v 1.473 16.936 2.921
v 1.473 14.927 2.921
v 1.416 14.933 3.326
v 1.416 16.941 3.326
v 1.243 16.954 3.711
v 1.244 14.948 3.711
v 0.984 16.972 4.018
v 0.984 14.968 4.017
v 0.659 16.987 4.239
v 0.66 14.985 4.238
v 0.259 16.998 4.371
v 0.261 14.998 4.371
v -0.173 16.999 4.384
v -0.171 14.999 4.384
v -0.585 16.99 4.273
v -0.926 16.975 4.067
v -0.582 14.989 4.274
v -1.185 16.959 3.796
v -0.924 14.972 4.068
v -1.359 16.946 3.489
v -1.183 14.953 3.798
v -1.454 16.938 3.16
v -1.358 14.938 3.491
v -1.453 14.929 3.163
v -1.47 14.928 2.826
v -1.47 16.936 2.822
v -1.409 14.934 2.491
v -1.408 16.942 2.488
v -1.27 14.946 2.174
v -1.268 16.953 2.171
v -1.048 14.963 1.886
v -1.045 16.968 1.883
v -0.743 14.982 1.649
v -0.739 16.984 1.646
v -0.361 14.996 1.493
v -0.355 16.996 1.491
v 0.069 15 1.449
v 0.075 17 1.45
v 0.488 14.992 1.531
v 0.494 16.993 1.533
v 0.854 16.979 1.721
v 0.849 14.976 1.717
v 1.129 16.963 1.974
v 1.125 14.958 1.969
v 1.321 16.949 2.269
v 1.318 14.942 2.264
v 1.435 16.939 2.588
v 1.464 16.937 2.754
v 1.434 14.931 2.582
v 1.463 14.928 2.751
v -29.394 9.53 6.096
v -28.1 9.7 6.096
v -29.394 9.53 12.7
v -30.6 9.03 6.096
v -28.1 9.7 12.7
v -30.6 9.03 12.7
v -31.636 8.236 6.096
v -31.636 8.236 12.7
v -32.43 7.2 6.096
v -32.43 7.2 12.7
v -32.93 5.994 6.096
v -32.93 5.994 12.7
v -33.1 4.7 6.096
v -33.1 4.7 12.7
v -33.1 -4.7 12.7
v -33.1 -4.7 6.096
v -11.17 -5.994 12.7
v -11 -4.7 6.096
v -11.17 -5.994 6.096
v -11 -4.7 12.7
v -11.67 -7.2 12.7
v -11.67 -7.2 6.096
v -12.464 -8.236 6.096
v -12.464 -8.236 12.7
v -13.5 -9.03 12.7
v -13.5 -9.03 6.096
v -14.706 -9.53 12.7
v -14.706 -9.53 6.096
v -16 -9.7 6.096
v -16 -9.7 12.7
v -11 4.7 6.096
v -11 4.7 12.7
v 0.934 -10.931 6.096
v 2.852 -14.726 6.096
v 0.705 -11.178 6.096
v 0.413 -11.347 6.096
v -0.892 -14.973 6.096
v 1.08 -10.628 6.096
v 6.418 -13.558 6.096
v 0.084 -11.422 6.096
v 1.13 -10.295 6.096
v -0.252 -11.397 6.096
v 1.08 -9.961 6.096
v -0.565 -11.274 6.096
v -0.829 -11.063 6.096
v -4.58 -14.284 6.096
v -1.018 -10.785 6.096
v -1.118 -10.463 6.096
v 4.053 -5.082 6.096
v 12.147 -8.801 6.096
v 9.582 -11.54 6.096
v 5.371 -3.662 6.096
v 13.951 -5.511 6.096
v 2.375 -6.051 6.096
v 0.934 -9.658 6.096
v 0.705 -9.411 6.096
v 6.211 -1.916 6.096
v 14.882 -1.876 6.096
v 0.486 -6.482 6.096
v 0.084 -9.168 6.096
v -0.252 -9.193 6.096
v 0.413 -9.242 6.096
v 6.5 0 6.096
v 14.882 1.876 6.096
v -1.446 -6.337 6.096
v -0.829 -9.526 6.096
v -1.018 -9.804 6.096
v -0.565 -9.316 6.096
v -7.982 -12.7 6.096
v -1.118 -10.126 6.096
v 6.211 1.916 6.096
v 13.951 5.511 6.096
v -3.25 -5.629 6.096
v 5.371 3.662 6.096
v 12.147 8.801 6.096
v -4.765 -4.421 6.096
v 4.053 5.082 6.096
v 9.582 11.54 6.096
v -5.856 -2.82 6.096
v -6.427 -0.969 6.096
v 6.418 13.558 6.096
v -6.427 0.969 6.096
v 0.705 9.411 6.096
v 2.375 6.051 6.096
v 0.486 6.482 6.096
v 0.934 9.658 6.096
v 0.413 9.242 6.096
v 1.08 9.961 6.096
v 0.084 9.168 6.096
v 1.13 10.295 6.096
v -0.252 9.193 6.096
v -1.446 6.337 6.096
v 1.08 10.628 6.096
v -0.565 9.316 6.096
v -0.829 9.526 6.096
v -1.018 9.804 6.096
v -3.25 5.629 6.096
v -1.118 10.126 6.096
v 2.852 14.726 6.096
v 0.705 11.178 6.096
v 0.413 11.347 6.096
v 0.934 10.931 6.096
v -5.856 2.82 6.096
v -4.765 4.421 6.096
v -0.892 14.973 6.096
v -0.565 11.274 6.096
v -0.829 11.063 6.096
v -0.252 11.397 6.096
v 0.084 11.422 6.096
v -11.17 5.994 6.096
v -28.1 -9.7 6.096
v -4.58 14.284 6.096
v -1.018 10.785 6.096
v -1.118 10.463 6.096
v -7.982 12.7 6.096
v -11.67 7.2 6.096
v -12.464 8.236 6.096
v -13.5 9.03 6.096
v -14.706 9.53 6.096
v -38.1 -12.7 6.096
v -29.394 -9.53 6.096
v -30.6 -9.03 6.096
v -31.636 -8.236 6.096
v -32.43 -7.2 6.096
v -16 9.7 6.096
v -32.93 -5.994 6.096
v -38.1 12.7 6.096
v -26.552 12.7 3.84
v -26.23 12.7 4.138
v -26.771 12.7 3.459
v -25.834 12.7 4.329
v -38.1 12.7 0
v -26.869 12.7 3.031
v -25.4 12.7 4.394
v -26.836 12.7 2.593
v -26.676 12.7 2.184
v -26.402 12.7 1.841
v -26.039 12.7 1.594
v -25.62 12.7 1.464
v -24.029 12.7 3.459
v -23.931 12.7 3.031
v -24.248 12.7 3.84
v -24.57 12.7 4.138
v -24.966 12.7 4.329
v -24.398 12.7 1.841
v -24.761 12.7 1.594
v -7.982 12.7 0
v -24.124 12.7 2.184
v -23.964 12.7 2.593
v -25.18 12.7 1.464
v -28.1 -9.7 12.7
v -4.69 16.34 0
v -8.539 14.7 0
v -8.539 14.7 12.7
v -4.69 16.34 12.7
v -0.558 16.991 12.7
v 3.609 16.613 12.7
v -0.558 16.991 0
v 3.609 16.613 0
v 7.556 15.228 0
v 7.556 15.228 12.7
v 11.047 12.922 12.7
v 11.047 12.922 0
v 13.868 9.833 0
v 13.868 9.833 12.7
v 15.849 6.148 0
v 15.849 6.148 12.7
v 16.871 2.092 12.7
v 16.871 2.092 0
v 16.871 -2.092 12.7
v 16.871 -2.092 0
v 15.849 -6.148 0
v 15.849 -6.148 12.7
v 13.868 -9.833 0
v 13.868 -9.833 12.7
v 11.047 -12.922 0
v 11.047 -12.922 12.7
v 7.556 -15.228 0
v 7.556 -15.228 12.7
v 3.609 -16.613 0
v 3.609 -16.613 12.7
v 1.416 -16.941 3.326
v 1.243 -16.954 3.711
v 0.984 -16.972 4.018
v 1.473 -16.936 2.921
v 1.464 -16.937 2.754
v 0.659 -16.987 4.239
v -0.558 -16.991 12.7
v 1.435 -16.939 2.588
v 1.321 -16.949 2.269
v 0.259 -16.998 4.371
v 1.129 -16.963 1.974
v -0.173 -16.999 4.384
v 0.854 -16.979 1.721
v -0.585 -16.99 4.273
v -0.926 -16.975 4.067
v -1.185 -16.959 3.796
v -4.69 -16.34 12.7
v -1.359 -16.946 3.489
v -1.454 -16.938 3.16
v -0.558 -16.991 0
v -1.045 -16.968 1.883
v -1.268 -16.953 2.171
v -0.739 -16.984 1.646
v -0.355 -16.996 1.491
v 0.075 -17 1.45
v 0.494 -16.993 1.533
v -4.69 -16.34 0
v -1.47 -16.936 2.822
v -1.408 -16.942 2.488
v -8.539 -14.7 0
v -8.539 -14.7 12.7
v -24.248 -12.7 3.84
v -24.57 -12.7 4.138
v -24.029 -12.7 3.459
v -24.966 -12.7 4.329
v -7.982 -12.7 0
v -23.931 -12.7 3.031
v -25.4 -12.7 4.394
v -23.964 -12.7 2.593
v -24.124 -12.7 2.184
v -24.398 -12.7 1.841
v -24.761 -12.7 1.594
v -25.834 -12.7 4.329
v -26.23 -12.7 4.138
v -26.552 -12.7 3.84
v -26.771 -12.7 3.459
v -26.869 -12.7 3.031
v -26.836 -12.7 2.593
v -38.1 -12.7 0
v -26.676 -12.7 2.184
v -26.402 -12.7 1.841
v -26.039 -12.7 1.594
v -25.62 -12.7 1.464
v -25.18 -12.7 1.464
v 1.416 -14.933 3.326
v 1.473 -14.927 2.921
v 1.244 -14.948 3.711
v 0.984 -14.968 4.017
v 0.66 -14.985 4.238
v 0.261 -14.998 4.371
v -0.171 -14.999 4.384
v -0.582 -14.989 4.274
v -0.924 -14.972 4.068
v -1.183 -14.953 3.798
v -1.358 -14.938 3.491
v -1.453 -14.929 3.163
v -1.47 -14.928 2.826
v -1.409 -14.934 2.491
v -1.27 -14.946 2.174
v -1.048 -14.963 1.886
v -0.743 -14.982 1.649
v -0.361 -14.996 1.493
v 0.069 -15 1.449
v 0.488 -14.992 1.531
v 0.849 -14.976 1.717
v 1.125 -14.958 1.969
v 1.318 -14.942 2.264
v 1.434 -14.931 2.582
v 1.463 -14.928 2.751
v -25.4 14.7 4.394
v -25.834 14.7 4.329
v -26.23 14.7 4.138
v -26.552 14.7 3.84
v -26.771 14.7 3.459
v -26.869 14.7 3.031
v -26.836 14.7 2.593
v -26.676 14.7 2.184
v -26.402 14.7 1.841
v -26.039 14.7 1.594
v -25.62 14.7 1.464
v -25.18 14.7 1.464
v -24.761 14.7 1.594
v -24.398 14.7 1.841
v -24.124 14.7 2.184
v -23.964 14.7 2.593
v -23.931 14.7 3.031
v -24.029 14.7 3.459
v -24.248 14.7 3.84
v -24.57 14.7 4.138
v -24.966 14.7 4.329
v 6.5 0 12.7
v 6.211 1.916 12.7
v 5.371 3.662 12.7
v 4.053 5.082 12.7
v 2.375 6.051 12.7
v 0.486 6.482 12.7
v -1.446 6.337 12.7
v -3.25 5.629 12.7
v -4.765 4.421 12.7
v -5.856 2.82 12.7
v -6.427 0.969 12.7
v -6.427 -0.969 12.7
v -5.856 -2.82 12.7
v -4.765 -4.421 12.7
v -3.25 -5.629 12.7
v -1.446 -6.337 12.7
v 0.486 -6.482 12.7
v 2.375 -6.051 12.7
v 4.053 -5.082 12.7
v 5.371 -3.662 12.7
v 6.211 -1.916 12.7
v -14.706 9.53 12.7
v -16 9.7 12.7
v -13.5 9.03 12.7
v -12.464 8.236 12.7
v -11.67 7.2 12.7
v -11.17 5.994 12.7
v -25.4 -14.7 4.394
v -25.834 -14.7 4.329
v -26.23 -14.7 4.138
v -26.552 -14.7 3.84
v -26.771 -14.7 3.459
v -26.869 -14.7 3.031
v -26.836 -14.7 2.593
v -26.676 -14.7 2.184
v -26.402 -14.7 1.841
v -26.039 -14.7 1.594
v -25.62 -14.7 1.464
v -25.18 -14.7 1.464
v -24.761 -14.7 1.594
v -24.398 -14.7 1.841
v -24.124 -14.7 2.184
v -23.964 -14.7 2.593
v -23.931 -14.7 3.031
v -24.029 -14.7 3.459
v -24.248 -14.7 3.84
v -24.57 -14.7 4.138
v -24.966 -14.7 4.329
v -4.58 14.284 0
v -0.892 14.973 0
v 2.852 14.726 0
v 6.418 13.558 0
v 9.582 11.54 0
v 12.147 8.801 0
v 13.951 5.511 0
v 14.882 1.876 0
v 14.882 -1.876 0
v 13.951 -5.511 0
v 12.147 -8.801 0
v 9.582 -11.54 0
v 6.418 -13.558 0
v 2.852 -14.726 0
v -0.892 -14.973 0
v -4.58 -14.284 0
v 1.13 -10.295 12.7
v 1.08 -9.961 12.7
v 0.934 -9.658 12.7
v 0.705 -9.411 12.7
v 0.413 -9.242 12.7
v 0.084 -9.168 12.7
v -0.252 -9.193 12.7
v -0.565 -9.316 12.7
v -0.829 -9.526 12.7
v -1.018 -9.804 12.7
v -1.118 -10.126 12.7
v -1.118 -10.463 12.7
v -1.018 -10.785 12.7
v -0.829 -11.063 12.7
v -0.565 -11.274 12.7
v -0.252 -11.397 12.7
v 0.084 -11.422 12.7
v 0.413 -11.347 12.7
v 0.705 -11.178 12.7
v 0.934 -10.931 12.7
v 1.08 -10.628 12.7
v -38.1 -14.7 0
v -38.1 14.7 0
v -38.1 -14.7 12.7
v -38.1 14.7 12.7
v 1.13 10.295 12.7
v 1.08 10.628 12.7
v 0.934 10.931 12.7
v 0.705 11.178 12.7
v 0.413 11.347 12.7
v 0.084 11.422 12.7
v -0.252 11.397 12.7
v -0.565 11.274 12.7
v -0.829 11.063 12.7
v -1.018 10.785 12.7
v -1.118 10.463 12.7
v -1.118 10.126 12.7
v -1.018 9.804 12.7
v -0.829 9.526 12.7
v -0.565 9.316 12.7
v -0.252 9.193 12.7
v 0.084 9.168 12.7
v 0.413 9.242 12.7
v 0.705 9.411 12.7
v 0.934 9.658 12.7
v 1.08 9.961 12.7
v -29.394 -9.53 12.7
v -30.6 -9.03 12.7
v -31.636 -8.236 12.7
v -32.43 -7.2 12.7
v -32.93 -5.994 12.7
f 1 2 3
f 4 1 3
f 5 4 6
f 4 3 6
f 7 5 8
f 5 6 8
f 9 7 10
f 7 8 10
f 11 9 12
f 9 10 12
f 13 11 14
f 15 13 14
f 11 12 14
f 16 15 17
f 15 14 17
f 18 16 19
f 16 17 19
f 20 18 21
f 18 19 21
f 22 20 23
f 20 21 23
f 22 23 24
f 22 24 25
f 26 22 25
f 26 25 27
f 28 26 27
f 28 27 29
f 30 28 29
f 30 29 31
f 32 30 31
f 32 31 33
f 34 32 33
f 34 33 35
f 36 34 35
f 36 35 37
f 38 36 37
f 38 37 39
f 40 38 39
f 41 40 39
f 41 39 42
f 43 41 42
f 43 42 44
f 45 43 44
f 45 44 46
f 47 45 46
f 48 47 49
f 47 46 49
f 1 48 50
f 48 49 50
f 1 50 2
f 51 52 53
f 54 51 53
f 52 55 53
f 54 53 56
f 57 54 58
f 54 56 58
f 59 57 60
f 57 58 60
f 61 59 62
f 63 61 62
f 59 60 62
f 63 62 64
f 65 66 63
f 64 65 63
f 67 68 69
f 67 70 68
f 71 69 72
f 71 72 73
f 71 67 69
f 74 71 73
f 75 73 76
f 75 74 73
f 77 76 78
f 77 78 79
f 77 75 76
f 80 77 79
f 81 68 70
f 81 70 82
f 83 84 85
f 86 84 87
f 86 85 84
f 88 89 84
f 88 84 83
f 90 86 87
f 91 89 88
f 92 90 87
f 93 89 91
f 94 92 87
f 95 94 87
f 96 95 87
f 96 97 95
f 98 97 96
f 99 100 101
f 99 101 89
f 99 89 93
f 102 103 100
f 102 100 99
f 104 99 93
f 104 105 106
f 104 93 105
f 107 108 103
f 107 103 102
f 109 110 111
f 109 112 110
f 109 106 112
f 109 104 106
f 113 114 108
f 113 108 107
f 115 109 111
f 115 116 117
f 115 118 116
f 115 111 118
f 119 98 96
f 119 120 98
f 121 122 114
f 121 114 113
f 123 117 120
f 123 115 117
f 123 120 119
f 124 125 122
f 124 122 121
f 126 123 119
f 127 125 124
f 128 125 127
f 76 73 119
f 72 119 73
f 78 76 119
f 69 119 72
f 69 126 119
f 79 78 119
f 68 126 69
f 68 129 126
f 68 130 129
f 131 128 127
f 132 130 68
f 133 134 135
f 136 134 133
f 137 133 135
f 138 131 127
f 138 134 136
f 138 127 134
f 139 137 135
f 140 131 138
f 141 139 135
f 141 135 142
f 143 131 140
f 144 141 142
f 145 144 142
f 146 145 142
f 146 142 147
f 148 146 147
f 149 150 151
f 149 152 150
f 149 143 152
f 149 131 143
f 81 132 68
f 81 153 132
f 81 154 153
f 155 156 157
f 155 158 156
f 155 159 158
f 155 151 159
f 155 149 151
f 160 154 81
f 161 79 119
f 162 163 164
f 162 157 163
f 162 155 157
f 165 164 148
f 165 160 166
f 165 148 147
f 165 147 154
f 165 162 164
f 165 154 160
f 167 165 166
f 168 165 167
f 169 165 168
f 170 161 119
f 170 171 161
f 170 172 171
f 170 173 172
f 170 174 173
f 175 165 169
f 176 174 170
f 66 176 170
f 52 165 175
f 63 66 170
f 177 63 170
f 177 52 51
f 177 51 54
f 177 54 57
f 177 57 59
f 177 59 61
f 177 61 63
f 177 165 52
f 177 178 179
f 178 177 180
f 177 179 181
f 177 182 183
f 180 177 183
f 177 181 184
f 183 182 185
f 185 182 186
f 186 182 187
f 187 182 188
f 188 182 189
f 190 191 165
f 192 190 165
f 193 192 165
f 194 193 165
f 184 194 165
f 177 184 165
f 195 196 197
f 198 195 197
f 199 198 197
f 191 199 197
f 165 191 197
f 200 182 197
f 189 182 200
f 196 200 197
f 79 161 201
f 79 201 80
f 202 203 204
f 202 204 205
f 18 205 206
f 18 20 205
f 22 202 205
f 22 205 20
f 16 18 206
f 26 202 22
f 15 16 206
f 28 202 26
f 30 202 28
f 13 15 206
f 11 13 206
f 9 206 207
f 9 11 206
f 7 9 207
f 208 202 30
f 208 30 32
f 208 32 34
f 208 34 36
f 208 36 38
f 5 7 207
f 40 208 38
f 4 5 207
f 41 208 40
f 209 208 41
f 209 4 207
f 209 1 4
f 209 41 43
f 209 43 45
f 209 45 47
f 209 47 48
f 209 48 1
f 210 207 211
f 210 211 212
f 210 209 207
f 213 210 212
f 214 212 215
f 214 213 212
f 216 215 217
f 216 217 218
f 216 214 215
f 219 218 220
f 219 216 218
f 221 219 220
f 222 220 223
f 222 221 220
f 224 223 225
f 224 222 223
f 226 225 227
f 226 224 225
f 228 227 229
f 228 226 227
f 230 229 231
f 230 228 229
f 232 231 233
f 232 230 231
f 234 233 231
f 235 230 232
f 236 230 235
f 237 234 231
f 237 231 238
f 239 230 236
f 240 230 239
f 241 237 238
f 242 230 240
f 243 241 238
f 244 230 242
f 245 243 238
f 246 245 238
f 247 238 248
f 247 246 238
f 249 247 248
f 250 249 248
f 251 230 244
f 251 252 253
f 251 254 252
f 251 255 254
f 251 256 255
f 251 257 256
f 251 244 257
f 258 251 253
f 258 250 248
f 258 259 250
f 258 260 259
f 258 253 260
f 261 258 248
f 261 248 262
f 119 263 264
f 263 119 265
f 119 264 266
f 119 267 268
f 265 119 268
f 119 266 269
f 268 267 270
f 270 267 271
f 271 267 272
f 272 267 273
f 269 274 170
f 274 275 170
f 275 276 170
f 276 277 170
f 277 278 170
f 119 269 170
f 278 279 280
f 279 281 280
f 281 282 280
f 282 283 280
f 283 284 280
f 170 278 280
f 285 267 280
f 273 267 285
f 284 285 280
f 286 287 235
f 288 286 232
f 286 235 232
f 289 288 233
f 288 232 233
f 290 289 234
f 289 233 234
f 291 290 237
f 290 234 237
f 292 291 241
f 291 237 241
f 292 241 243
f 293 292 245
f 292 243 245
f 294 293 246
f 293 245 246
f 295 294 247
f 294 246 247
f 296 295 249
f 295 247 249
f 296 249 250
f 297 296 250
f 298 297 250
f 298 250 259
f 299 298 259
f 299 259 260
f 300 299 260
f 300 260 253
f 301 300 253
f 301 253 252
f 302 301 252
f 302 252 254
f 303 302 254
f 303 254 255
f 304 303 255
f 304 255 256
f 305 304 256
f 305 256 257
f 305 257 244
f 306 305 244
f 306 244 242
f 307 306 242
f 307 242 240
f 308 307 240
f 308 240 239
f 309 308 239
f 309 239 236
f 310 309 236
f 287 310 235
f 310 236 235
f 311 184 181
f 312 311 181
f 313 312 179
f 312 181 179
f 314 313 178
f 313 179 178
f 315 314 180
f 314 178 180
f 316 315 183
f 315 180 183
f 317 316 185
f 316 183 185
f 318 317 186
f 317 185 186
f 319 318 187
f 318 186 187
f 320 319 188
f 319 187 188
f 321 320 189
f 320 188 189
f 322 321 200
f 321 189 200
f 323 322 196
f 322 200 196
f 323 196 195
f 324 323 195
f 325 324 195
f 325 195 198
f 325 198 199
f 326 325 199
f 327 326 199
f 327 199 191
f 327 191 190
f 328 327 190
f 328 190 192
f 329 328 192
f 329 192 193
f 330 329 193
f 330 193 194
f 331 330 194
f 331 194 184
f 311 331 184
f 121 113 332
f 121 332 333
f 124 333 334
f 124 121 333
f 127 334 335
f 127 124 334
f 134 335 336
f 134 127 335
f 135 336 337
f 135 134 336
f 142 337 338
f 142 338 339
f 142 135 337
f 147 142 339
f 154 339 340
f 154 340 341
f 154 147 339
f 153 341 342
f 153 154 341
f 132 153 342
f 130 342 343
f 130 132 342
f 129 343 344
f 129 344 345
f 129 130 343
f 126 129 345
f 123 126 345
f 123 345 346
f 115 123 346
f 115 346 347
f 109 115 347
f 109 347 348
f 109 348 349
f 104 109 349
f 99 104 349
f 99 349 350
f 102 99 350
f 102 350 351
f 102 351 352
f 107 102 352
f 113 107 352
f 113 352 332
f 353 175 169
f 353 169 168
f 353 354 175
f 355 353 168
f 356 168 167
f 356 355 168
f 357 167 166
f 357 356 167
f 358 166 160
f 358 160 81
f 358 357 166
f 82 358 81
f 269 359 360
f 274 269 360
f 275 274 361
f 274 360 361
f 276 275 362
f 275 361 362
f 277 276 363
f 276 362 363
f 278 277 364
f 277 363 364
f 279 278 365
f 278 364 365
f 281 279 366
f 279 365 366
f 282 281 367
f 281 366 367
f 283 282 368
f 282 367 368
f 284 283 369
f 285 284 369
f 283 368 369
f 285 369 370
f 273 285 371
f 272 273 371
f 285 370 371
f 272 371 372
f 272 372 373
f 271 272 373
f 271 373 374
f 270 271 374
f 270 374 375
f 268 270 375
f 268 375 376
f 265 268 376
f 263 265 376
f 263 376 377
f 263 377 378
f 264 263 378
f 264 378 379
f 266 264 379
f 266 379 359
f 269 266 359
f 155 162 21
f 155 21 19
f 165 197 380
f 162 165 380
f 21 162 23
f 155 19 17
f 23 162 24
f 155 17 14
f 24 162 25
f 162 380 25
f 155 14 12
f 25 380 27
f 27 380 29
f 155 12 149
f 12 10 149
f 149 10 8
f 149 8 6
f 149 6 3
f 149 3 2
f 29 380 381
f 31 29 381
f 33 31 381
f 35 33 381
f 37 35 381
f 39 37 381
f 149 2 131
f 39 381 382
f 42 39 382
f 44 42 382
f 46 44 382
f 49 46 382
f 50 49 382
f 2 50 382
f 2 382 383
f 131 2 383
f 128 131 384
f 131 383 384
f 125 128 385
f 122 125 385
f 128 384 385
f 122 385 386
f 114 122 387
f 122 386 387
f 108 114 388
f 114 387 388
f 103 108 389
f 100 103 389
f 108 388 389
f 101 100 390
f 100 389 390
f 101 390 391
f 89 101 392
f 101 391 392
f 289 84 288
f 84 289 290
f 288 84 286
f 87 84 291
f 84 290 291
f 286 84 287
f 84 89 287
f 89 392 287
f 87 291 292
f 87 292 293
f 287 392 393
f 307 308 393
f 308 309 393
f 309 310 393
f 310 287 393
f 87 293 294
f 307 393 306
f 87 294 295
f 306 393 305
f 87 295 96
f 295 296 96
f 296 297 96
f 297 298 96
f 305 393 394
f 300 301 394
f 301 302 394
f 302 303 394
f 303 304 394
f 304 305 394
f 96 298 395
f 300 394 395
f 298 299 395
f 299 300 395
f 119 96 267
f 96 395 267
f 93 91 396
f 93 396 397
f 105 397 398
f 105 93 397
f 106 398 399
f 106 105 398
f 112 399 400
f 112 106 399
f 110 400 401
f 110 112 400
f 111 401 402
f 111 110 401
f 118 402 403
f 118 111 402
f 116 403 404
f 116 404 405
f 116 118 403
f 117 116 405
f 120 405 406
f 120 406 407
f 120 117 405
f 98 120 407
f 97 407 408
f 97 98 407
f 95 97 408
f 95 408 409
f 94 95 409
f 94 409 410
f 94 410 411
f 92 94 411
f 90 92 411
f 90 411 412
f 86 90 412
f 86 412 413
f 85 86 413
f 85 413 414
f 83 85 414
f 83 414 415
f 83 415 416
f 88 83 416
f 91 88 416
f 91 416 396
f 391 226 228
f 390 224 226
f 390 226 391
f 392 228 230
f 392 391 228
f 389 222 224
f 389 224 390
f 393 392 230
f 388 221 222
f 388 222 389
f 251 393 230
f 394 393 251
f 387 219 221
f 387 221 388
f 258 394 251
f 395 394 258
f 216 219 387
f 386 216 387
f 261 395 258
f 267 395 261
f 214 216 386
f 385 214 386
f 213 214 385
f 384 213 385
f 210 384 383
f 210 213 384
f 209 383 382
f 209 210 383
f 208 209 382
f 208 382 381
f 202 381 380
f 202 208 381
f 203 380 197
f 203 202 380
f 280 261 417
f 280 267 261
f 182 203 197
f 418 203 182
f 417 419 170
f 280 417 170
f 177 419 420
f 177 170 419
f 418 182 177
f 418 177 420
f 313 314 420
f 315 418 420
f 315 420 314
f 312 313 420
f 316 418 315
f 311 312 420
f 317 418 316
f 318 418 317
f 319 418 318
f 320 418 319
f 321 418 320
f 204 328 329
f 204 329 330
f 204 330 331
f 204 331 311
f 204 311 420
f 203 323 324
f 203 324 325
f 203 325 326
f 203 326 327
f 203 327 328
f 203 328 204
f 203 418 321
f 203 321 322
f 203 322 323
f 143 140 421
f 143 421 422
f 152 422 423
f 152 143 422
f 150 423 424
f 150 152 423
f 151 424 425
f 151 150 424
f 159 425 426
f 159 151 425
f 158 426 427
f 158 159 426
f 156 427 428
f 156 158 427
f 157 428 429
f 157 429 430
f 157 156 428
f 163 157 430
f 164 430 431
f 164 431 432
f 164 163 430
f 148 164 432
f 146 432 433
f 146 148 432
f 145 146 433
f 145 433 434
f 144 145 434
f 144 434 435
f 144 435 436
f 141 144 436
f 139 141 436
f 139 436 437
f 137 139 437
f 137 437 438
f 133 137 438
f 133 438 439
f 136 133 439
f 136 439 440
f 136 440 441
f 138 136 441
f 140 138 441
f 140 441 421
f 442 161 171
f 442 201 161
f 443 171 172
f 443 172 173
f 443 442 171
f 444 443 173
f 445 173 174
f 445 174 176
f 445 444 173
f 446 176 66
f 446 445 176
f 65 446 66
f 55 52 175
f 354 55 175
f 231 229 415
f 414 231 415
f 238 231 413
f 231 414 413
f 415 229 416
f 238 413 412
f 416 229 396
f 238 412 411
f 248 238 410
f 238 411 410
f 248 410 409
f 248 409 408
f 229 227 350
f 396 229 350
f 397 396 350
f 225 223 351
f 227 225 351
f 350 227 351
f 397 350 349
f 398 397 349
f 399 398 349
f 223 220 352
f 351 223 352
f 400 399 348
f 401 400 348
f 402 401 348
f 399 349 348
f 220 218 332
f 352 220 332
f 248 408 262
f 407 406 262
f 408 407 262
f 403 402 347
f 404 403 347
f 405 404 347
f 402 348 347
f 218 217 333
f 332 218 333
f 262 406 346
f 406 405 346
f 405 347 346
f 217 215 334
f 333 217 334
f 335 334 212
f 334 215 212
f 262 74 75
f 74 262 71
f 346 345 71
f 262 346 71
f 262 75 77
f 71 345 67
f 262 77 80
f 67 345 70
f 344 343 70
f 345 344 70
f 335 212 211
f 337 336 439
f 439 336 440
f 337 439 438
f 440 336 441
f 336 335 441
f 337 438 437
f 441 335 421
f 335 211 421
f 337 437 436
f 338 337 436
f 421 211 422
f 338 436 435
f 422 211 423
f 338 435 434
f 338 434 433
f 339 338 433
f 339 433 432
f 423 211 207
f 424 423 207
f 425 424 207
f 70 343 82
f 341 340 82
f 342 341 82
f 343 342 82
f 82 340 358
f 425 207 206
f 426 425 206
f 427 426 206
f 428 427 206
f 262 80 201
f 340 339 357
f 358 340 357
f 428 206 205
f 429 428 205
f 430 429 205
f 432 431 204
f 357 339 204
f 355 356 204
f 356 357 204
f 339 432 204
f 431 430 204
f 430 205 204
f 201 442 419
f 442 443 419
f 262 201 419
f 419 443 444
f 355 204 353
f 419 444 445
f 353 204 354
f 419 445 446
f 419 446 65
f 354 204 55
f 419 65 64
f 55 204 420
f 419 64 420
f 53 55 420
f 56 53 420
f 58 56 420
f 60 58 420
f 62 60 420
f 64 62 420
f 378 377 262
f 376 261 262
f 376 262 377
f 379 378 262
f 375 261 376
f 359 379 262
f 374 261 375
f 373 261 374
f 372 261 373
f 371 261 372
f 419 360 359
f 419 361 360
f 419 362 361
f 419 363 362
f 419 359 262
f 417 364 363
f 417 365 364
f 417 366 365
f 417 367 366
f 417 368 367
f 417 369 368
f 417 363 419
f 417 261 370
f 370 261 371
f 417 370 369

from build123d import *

# Parameters (mm, degrees)
SKETCH2_R           = 6.5
SKETCH2_R_2         = 1.1303
SKETCH2_W           = 22.1
SKETCH2_H           = 19.4
BOSS_EXTRUDE1_DEPTH = 12.7
CUT_EXTRUDE1_DEPTH  = 6.096
FILLET1_R           = 5
SKETCH6_R           = 1.4732
CUT_EXTRUDE4_DEPTH  = 53.620338273


with BuildPart() as part:
    # Sketch2 → Boss-Extrude1 (new body)
    with BuildSketch(Plane.XY):
        with BuildLine():
            Line((-38.1, -14.7), (-38.1, 14.7))
            Line((-38.1, 14.7), (-8.538735269, 14.7))
            ThreePointArc((-8.538735269, 14.7), (17, 0), (-8.538735269, -14.7))
            Line((-8.538735269, -14.7), (-38.1, -14.7))
        make_face()
        Circle(SKETCH2_R, mode=Mode.SUBTRACT)
        with Locations((0, -10.294657794)):
            Circle(SKETCH2_R_2, mode=Mode.SUBTRACT)
        with Locations((0, 10.294657794)):
            Circle(SKETCH2_R_2, mode=Mode.SUBTRACT)
        with Locations((-22.05, 0)):
            Rectangle(SKETCH2_W, SKETCH2_H, mode=Mode.SUBTRACT)
    extrude(amount=BOSS_EXTRUDE1_DEPTH)

    # Sketch1 → Cut-Extrude1 (cut)
    with BuildSketch(Plane.XY):
        with BuildLine():
            Line((-38.1, -12.7), (-38.1, 12.7))
            Line((-38.1, 12.7), (-7.981854421, 12.7))
            ThreePointArc((-7.981854421, 12.7), (15, 0), (-7.981854421, -12.7))
            Line((-7.981854421, -12.7), (-38.1, -12.7))
        make_face()
    extrude(amount=CUT_EXTRUDE1_DEPTH, mode=Mode.SUBTRACT)

    # Fillet1
    fillet1_edges = [part.edges().sort_by_distance(p)[0] for p in [
        (-33.1, 9.7, 9.398),
        (-33.1, -9.7, 9.398),
        (-11, -9.7, 9.398),
        (-11, 9.7, 9.398),
    ]]
    fillet(fillet1_edges, radius=FILLET1_R)

    # Sketch6 → Cut-Extrude4 (cut, through all)
    with BuildSketch(Plane(origin=(0, -17, 0), x_dir=(-1, 0, 0), z_dir=(0, -1, 0))):
        with Locations(Location((0, -2.921, 0), (0, 0, 180))):
            Circle(SKETCH6_R)
        with Locations(Location((25.4, -2.921, 0), (0, 0, 270))):
            Circle(SKETCH6_R)
    extrude(amount=-CUT_EXTRUDE4_DEPTH, mode=Mode.SUBTRACT)


solid = part.part
